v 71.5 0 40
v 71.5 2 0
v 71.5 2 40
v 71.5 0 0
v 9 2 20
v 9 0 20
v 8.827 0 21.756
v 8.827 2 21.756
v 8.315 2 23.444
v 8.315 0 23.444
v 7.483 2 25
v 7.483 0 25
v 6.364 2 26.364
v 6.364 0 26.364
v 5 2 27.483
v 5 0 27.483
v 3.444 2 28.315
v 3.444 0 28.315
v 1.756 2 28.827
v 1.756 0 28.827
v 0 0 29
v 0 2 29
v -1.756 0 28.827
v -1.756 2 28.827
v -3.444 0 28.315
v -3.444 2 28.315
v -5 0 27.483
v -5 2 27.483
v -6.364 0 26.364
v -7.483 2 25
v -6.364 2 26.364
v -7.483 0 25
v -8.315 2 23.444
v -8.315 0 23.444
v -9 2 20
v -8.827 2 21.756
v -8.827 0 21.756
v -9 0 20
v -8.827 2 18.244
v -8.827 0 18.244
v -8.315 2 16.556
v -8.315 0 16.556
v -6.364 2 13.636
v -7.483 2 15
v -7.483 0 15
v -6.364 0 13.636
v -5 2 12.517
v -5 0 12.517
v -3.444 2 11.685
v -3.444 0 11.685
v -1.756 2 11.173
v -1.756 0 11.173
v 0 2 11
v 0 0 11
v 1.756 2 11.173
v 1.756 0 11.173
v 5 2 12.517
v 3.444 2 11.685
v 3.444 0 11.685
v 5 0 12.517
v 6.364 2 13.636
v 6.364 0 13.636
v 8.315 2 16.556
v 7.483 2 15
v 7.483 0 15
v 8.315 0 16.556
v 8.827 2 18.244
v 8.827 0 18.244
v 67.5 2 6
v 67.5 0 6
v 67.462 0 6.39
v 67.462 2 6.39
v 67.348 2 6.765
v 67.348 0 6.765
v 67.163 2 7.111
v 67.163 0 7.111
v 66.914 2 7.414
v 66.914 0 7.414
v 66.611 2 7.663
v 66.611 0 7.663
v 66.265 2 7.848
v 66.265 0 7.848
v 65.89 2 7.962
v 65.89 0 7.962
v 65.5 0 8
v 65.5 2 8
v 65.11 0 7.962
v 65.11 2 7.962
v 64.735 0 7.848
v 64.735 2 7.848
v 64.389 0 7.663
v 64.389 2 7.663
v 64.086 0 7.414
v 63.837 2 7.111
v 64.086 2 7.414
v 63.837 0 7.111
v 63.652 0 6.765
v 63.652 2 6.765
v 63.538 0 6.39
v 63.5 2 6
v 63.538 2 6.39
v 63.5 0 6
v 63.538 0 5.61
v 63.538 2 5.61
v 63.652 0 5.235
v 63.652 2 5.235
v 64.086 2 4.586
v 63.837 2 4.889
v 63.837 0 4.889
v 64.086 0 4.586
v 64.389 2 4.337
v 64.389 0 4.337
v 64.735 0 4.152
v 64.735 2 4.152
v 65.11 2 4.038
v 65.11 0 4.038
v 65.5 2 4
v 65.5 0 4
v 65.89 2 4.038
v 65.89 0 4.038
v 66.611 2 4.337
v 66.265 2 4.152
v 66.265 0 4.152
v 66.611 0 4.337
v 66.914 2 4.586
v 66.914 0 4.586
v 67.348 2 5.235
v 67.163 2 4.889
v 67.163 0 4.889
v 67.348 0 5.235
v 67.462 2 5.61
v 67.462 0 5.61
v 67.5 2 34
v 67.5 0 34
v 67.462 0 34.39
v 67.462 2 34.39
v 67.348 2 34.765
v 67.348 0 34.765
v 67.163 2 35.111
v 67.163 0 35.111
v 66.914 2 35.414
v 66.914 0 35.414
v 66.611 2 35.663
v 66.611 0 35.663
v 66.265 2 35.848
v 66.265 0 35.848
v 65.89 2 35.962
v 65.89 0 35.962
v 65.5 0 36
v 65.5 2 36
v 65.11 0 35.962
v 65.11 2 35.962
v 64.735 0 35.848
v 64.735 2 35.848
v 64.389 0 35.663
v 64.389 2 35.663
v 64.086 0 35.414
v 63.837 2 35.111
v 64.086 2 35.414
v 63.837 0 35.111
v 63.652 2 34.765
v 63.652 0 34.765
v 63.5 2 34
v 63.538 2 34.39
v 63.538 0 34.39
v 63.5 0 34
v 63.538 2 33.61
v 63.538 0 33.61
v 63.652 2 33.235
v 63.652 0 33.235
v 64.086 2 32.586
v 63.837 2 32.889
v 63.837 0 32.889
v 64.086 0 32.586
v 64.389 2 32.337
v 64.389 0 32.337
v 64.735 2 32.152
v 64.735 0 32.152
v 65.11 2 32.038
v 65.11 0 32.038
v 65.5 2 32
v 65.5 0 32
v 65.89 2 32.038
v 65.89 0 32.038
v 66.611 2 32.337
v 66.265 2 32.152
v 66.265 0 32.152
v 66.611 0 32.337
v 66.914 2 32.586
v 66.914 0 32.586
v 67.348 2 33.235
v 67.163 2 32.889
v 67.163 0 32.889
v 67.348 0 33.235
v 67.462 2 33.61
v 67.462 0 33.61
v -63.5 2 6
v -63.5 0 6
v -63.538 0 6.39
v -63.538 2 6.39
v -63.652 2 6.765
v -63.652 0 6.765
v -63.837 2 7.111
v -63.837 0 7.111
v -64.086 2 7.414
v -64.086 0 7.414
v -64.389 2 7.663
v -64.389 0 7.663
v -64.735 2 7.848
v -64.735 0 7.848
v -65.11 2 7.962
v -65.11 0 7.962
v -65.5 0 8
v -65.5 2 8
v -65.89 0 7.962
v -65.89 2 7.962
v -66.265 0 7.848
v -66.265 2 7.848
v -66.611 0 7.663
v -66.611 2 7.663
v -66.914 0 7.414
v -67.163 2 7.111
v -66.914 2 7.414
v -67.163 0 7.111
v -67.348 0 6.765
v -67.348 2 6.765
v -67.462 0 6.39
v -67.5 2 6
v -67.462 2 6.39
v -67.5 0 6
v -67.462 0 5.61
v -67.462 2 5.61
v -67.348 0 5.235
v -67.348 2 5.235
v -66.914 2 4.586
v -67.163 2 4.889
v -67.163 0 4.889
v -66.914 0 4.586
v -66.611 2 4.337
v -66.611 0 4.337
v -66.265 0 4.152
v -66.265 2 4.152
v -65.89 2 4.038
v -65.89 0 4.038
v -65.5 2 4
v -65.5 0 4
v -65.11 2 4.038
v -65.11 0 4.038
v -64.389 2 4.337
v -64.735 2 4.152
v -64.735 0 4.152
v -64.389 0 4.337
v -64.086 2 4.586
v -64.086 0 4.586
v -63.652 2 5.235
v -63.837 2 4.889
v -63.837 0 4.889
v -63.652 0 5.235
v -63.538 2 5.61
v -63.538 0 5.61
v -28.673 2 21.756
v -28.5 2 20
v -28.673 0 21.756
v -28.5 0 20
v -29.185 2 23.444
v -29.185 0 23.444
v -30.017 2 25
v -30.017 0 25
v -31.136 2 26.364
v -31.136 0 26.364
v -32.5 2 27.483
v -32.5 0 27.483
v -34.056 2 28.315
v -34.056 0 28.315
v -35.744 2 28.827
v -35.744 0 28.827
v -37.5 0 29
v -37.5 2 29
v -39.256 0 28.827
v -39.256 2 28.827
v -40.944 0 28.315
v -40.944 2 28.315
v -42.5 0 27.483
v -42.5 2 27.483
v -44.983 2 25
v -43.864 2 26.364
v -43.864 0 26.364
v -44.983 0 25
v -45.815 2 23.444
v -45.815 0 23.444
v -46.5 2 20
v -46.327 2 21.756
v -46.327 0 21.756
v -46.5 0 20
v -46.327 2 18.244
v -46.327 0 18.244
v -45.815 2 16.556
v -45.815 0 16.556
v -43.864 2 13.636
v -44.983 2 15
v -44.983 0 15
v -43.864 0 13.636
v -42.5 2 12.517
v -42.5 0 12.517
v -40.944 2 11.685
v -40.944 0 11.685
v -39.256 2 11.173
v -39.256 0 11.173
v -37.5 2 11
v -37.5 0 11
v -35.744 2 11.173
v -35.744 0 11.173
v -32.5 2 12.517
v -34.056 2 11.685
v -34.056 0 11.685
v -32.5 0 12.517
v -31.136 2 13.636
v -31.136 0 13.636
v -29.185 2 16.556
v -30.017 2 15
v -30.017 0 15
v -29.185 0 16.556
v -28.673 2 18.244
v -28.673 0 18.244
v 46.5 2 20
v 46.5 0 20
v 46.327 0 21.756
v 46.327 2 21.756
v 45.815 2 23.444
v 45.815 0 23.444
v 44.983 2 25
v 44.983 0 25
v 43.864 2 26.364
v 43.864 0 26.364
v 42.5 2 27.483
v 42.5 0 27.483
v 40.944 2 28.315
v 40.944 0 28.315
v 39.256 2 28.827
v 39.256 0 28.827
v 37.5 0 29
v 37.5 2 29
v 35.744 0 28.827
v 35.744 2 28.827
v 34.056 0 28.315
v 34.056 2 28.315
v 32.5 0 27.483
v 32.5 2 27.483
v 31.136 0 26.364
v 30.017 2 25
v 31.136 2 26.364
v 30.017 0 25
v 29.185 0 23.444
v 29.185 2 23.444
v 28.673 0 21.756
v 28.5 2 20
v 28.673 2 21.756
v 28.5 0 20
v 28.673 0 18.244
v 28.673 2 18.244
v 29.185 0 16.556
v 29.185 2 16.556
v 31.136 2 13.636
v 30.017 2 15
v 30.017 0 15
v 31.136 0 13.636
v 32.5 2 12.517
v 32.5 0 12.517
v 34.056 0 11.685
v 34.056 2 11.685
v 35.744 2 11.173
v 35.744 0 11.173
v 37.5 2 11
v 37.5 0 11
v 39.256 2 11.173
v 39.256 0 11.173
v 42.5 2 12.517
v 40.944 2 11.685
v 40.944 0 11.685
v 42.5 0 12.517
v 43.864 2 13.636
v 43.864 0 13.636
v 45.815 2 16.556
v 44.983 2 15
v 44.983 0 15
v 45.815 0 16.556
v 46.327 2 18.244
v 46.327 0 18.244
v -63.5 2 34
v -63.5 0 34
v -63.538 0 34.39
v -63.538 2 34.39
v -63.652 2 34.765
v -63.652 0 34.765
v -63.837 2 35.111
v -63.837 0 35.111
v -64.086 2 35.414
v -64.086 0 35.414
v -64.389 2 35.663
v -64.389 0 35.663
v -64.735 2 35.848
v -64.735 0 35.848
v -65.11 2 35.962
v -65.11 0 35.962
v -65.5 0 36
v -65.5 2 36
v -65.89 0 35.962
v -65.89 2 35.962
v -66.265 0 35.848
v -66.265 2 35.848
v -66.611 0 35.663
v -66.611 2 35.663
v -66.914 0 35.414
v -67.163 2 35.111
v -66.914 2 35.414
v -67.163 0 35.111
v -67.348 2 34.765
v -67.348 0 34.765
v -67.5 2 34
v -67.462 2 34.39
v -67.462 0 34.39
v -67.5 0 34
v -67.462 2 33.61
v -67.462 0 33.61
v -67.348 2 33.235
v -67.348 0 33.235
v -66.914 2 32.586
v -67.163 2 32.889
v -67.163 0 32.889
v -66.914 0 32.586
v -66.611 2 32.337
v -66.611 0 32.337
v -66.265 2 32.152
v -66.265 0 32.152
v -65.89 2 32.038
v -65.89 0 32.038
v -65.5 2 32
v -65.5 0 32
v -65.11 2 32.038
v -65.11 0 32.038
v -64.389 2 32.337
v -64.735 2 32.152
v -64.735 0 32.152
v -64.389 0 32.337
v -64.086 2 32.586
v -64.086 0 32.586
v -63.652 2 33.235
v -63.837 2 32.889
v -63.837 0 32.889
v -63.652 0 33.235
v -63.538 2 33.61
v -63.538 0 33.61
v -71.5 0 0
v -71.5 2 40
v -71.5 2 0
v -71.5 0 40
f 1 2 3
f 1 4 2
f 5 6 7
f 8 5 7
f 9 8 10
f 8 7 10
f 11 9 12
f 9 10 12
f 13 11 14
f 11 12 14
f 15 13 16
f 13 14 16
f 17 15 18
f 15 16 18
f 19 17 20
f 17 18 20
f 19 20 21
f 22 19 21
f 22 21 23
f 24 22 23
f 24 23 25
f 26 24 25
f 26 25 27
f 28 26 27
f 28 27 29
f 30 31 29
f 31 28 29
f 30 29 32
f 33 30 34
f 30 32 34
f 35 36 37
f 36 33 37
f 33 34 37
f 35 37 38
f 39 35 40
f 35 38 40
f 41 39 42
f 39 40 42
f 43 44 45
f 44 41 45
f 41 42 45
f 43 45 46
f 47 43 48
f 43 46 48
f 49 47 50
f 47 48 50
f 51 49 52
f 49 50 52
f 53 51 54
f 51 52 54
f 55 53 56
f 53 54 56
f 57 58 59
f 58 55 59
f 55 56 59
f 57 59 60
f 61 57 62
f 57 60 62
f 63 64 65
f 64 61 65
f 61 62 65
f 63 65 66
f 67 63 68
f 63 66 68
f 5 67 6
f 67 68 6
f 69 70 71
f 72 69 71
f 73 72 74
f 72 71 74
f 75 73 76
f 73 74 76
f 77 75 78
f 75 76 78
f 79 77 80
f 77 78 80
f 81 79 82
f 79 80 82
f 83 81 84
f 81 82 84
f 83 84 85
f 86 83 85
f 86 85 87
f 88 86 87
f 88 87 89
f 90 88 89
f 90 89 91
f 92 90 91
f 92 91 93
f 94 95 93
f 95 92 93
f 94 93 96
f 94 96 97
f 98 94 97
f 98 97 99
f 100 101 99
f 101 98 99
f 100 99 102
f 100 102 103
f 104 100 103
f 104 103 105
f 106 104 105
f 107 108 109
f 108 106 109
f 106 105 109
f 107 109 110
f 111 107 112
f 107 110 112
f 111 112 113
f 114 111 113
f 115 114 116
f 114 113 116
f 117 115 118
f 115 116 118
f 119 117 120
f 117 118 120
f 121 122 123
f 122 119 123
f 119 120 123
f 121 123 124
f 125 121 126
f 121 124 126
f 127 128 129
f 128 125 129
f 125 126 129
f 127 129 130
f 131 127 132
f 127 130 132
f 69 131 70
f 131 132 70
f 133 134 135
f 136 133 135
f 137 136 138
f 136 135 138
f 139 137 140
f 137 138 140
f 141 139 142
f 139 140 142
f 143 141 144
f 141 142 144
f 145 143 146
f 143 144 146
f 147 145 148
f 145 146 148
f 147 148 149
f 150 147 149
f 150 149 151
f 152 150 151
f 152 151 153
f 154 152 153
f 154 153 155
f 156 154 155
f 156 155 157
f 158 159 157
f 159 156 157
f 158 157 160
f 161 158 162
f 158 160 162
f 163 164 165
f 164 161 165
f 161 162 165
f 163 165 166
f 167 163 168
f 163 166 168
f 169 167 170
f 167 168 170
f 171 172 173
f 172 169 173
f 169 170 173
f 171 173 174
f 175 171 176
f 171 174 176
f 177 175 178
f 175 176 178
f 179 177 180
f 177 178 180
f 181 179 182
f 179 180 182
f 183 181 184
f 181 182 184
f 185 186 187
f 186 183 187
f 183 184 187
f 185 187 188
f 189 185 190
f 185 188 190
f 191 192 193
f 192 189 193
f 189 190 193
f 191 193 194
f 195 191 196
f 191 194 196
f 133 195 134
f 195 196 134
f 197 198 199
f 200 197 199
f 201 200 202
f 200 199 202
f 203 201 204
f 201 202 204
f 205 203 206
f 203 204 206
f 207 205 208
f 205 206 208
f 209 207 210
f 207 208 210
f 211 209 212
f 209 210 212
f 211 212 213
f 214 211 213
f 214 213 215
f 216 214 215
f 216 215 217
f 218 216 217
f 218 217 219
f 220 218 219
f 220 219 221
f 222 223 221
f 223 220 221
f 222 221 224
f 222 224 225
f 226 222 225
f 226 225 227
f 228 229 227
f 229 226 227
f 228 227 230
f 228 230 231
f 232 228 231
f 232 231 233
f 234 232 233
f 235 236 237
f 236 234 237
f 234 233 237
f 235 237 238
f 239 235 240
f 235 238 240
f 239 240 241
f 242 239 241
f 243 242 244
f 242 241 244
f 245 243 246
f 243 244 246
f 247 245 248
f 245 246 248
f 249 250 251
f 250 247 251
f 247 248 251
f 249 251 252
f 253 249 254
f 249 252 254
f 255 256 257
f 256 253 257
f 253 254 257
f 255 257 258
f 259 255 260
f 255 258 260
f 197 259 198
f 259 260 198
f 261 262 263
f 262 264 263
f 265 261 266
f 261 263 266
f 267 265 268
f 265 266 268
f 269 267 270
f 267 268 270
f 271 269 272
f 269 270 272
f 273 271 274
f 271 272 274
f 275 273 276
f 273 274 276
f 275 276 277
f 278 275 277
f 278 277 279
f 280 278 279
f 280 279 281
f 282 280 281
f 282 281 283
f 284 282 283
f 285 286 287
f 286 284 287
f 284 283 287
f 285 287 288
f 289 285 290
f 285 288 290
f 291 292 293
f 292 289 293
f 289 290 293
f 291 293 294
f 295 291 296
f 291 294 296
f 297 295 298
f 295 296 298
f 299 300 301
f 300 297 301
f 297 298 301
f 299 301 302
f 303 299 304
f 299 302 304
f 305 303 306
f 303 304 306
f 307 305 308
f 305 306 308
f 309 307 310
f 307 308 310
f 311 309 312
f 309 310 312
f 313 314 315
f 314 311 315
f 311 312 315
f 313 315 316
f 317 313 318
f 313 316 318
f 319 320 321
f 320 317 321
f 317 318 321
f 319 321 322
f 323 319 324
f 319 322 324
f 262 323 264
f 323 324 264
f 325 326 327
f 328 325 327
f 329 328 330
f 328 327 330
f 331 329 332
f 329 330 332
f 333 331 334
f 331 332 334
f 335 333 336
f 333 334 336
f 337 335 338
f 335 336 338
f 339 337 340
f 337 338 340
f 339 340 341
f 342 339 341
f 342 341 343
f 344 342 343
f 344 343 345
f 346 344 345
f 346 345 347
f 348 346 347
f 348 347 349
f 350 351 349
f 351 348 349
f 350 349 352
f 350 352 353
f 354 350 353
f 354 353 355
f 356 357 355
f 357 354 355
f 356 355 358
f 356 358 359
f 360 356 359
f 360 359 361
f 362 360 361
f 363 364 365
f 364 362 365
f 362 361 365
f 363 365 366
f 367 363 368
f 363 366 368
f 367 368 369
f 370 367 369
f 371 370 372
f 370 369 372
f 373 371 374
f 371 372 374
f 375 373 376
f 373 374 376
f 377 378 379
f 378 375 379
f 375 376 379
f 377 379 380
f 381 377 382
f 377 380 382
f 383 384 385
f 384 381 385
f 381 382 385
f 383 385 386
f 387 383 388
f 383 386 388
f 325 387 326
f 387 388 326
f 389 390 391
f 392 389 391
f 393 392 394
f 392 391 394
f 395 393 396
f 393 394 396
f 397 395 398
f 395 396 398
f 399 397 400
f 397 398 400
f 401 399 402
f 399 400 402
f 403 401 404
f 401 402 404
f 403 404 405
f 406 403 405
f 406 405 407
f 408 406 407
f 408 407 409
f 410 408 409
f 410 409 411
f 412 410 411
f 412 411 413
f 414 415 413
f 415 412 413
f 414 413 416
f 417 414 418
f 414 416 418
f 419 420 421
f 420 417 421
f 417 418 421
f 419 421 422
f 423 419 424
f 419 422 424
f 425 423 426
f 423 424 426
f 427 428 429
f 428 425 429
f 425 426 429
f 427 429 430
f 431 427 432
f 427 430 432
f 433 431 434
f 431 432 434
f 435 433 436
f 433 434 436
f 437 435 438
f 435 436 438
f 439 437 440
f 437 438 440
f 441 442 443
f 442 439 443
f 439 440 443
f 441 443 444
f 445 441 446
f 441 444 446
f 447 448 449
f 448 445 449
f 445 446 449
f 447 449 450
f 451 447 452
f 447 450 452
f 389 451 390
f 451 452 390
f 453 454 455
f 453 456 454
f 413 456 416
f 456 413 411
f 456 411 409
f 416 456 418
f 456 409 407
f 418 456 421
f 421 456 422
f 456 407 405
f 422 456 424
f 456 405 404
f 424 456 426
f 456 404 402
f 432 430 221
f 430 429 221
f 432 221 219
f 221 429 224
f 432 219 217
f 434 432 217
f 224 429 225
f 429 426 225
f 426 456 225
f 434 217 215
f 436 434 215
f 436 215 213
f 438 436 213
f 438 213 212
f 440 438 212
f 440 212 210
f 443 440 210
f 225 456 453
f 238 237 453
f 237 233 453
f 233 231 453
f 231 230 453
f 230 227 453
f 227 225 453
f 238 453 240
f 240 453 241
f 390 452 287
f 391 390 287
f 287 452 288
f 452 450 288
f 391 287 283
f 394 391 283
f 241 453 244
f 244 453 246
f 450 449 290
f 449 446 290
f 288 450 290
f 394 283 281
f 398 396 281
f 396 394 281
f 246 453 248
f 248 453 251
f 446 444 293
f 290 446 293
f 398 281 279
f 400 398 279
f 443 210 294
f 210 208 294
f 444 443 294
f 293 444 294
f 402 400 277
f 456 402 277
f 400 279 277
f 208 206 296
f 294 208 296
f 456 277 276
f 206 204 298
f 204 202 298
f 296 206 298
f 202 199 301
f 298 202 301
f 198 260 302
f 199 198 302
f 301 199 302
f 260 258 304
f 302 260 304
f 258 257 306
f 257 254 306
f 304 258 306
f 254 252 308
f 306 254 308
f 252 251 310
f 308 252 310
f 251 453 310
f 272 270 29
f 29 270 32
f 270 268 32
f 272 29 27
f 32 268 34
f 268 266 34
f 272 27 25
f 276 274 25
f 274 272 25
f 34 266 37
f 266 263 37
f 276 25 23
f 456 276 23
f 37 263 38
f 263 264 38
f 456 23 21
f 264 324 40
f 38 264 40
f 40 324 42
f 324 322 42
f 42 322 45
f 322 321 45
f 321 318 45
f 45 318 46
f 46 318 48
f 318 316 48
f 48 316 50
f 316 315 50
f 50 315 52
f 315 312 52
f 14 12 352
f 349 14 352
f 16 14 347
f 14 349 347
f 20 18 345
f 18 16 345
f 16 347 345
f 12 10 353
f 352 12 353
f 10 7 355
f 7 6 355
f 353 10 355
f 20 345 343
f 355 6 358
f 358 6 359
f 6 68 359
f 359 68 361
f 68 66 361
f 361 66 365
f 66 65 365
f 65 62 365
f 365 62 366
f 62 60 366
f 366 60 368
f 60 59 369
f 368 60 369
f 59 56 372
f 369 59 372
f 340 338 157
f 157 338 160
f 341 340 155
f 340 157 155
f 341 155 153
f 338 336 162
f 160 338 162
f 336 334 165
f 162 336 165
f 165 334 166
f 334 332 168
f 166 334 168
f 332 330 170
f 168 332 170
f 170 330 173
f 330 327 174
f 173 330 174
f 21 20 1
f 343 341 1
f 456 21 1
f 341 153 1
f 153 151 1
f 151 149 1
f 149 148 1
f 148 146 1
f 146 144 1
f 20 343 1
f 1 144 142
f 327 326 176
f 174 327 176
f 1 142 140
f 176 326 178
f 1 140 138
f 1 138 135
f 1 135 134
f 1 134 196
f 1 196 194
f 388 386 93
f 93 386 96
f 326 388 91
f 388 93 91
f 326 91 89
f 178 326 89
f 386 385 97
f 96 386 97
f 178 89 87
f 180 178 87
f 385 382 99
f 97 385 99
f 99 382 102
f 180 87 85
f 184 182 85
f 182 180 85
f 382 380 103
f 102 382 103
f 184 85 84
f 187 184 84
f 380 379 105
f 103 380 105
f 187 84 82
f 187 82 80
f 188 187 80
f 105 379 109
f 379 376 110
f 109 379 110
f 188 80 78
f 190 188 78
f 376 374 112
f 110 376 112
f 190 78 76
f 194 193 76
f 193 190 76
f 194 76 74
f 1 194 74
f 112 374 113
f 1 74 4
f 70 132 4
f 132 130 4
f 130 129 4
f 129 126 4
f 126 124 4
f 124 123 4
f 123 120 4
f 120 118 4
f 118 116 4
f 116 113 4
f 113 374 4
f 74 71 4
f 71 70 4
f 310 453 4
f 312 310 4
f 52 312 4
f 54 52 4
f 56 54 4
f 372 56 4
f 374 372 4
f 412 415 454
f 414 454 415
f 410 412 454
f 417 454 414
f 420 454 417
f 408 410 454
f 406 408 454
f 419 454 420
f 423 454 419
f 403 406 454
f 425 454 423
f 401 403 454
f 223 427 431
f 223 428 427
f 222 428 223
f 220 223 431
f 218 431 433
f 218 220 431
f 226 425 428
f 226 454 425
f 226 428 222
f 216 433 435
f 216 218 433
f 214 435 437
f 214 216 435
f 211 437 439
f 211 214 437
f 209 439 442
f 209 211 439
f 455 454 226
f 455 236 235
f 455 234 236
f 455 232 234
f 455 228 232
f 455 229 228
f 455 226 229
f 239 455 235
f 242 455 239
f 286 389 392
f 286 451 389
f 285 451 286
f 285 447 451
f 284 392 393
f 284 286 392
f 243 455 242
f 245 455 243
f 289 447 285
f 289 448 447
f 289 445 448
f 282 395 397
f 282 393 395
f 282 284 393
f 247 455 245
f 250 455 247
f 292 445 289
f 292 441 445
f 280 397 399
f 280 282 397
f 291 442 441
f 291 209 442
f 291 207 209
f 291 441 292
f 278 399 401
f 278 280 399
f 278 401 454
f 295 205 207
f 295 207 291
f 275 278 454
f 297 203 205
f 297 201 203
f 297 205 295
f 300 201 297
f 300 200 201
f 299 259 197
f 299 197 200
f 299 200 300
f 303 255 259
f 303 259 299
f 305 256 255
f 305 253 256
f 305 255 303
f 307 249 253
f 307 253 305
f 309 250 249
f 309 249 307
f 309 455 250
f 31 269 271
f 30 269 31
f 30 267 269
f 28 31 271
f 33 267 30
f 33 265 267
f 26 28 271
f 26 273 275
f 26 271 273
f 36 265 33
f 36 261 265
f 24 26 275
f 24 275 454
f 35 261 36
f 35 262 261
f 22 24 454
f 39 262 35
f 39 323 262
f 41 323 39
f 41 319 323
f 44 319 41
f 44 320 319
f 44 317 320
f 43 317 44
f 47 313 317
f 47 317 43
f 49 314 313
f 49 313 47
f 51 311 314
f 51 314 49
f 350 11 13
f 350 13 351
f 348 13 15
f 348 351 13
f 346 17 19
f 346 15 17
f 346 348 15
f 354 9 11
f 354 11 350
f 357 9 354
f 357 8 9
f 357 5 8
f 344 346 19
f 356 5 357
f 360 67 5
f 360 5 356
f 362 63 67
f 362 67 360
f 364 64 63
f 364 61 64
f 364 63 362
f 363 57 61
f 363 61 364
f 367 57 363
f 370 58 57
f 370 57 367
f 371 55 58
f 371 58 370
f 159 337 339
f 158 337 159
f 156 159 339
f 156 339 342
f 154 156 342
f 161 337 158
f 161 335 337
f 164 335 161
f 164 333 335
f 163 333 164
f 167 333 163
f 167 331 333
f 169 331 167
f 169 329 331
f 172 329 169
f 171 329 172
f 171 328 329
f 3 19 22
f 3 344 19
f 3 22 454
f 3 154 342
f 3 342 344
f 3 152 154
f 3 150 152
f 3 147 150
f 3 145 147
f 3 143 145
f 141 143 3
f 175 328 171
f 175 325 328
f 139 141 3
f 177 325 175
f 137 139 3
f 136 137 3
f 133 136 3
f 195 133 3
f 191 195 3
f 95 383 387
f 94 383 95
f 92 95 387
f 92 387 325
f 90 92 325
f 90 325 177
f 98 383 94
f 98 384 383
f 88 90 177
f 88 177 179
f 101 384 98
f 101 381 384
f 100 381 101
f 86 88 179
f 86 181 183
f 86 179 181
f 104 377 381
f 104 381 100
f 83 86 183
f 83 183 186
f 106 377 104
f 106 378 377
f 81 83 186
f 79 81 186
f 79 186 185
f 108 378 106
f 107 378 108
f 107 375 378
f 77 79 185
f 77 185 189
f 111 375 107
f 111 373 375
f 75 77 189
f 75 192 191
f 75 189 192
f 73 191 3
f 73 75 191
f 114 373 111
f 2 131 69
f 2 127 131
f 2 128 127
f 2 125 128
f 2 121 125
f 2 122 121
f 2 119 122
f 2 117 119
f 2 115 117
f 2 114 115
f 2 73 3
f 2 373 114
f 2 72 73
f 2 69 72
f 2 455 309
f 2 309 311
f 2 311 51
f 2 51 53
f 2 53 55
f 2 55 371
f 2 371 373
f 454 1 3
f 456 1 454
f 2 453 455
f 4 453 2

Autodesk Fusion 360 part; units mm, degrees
sketch "Sketch1" plane through (0, 0, 0) normal (0, 1, 0) x (1, 0, 0)
  line L0 (0, 0) -> (0, -50.0731) construction
  line L1 (-71.5, 0) -> (71.5, 0)
  line L2 (71.5, 0) -> (71.5, -40)
  line L3 (71.5, -40) -> (-71.5, -40)
  line L4 (-71.5, -40) -> (-71.5, 0)
  line L5 (-71.5, -20) -> (71.5, -20) construction
  line L6 (-65.5, -34) -> (65.5, -34) construction
  line L7 (65.5, -34) -> (65.5, -6) construction
  line L8 (65.5, -6) -> (-65.5, -6) construction
  line L9 (-65.5, -6) -> (-65.5, -34) construction
  circle A0 centre (-65.5, -34) radius 2
  circle A1 centre (65.5, -34) radius 2
  circle A2 centre (65.5, -6) radius 2
  circle A3 centre (-65.5, -6) radius 2
  circle A4 centre (37.5, -20) radius 9
  circle A5 centre (-37.5, -20) radius 9
  circle A6 centre (0, -20) radius 9
  dimension "d1" = 143
  dimension "d2" = 40
  dimension "d3" = 71.5
  dimension "d4" = 40
  dimension "d5" = 6
  dimension "d6" = 6
  dimension "d7" = 6
  dimension "d8" = 6
  dimension "d9" = 4
  dimension "d10" = 4
  dimension "d11" = 4
  dimension "d12" = 4
  dimension "d16" = 18
  dimension "d17" = 18
  dimension "d25" = 18
  dimension "d26" = 37.5
  dimension "d27" = 37.5
extrude "Extrude1" add sketch "Sketch1" along normal blind 2
equation "d3 = d1 / 2"
equation "d4 = d2"
equation "d6 = d5"
equation "d8 = d7"
equation "d10 = d9"
equation "d11 = d9"
equation "d12 = d9"
equation "HoleSpread = 75 mm"
equation "HoleDia = 18 mm"
equation "d16 = HoleDia"
equation "d17 = HoleDia"
equation "d25 = HoleDia"
equation "d26 = HoleSpread / 2"
equation "d27 = HoleSpread / 2"
